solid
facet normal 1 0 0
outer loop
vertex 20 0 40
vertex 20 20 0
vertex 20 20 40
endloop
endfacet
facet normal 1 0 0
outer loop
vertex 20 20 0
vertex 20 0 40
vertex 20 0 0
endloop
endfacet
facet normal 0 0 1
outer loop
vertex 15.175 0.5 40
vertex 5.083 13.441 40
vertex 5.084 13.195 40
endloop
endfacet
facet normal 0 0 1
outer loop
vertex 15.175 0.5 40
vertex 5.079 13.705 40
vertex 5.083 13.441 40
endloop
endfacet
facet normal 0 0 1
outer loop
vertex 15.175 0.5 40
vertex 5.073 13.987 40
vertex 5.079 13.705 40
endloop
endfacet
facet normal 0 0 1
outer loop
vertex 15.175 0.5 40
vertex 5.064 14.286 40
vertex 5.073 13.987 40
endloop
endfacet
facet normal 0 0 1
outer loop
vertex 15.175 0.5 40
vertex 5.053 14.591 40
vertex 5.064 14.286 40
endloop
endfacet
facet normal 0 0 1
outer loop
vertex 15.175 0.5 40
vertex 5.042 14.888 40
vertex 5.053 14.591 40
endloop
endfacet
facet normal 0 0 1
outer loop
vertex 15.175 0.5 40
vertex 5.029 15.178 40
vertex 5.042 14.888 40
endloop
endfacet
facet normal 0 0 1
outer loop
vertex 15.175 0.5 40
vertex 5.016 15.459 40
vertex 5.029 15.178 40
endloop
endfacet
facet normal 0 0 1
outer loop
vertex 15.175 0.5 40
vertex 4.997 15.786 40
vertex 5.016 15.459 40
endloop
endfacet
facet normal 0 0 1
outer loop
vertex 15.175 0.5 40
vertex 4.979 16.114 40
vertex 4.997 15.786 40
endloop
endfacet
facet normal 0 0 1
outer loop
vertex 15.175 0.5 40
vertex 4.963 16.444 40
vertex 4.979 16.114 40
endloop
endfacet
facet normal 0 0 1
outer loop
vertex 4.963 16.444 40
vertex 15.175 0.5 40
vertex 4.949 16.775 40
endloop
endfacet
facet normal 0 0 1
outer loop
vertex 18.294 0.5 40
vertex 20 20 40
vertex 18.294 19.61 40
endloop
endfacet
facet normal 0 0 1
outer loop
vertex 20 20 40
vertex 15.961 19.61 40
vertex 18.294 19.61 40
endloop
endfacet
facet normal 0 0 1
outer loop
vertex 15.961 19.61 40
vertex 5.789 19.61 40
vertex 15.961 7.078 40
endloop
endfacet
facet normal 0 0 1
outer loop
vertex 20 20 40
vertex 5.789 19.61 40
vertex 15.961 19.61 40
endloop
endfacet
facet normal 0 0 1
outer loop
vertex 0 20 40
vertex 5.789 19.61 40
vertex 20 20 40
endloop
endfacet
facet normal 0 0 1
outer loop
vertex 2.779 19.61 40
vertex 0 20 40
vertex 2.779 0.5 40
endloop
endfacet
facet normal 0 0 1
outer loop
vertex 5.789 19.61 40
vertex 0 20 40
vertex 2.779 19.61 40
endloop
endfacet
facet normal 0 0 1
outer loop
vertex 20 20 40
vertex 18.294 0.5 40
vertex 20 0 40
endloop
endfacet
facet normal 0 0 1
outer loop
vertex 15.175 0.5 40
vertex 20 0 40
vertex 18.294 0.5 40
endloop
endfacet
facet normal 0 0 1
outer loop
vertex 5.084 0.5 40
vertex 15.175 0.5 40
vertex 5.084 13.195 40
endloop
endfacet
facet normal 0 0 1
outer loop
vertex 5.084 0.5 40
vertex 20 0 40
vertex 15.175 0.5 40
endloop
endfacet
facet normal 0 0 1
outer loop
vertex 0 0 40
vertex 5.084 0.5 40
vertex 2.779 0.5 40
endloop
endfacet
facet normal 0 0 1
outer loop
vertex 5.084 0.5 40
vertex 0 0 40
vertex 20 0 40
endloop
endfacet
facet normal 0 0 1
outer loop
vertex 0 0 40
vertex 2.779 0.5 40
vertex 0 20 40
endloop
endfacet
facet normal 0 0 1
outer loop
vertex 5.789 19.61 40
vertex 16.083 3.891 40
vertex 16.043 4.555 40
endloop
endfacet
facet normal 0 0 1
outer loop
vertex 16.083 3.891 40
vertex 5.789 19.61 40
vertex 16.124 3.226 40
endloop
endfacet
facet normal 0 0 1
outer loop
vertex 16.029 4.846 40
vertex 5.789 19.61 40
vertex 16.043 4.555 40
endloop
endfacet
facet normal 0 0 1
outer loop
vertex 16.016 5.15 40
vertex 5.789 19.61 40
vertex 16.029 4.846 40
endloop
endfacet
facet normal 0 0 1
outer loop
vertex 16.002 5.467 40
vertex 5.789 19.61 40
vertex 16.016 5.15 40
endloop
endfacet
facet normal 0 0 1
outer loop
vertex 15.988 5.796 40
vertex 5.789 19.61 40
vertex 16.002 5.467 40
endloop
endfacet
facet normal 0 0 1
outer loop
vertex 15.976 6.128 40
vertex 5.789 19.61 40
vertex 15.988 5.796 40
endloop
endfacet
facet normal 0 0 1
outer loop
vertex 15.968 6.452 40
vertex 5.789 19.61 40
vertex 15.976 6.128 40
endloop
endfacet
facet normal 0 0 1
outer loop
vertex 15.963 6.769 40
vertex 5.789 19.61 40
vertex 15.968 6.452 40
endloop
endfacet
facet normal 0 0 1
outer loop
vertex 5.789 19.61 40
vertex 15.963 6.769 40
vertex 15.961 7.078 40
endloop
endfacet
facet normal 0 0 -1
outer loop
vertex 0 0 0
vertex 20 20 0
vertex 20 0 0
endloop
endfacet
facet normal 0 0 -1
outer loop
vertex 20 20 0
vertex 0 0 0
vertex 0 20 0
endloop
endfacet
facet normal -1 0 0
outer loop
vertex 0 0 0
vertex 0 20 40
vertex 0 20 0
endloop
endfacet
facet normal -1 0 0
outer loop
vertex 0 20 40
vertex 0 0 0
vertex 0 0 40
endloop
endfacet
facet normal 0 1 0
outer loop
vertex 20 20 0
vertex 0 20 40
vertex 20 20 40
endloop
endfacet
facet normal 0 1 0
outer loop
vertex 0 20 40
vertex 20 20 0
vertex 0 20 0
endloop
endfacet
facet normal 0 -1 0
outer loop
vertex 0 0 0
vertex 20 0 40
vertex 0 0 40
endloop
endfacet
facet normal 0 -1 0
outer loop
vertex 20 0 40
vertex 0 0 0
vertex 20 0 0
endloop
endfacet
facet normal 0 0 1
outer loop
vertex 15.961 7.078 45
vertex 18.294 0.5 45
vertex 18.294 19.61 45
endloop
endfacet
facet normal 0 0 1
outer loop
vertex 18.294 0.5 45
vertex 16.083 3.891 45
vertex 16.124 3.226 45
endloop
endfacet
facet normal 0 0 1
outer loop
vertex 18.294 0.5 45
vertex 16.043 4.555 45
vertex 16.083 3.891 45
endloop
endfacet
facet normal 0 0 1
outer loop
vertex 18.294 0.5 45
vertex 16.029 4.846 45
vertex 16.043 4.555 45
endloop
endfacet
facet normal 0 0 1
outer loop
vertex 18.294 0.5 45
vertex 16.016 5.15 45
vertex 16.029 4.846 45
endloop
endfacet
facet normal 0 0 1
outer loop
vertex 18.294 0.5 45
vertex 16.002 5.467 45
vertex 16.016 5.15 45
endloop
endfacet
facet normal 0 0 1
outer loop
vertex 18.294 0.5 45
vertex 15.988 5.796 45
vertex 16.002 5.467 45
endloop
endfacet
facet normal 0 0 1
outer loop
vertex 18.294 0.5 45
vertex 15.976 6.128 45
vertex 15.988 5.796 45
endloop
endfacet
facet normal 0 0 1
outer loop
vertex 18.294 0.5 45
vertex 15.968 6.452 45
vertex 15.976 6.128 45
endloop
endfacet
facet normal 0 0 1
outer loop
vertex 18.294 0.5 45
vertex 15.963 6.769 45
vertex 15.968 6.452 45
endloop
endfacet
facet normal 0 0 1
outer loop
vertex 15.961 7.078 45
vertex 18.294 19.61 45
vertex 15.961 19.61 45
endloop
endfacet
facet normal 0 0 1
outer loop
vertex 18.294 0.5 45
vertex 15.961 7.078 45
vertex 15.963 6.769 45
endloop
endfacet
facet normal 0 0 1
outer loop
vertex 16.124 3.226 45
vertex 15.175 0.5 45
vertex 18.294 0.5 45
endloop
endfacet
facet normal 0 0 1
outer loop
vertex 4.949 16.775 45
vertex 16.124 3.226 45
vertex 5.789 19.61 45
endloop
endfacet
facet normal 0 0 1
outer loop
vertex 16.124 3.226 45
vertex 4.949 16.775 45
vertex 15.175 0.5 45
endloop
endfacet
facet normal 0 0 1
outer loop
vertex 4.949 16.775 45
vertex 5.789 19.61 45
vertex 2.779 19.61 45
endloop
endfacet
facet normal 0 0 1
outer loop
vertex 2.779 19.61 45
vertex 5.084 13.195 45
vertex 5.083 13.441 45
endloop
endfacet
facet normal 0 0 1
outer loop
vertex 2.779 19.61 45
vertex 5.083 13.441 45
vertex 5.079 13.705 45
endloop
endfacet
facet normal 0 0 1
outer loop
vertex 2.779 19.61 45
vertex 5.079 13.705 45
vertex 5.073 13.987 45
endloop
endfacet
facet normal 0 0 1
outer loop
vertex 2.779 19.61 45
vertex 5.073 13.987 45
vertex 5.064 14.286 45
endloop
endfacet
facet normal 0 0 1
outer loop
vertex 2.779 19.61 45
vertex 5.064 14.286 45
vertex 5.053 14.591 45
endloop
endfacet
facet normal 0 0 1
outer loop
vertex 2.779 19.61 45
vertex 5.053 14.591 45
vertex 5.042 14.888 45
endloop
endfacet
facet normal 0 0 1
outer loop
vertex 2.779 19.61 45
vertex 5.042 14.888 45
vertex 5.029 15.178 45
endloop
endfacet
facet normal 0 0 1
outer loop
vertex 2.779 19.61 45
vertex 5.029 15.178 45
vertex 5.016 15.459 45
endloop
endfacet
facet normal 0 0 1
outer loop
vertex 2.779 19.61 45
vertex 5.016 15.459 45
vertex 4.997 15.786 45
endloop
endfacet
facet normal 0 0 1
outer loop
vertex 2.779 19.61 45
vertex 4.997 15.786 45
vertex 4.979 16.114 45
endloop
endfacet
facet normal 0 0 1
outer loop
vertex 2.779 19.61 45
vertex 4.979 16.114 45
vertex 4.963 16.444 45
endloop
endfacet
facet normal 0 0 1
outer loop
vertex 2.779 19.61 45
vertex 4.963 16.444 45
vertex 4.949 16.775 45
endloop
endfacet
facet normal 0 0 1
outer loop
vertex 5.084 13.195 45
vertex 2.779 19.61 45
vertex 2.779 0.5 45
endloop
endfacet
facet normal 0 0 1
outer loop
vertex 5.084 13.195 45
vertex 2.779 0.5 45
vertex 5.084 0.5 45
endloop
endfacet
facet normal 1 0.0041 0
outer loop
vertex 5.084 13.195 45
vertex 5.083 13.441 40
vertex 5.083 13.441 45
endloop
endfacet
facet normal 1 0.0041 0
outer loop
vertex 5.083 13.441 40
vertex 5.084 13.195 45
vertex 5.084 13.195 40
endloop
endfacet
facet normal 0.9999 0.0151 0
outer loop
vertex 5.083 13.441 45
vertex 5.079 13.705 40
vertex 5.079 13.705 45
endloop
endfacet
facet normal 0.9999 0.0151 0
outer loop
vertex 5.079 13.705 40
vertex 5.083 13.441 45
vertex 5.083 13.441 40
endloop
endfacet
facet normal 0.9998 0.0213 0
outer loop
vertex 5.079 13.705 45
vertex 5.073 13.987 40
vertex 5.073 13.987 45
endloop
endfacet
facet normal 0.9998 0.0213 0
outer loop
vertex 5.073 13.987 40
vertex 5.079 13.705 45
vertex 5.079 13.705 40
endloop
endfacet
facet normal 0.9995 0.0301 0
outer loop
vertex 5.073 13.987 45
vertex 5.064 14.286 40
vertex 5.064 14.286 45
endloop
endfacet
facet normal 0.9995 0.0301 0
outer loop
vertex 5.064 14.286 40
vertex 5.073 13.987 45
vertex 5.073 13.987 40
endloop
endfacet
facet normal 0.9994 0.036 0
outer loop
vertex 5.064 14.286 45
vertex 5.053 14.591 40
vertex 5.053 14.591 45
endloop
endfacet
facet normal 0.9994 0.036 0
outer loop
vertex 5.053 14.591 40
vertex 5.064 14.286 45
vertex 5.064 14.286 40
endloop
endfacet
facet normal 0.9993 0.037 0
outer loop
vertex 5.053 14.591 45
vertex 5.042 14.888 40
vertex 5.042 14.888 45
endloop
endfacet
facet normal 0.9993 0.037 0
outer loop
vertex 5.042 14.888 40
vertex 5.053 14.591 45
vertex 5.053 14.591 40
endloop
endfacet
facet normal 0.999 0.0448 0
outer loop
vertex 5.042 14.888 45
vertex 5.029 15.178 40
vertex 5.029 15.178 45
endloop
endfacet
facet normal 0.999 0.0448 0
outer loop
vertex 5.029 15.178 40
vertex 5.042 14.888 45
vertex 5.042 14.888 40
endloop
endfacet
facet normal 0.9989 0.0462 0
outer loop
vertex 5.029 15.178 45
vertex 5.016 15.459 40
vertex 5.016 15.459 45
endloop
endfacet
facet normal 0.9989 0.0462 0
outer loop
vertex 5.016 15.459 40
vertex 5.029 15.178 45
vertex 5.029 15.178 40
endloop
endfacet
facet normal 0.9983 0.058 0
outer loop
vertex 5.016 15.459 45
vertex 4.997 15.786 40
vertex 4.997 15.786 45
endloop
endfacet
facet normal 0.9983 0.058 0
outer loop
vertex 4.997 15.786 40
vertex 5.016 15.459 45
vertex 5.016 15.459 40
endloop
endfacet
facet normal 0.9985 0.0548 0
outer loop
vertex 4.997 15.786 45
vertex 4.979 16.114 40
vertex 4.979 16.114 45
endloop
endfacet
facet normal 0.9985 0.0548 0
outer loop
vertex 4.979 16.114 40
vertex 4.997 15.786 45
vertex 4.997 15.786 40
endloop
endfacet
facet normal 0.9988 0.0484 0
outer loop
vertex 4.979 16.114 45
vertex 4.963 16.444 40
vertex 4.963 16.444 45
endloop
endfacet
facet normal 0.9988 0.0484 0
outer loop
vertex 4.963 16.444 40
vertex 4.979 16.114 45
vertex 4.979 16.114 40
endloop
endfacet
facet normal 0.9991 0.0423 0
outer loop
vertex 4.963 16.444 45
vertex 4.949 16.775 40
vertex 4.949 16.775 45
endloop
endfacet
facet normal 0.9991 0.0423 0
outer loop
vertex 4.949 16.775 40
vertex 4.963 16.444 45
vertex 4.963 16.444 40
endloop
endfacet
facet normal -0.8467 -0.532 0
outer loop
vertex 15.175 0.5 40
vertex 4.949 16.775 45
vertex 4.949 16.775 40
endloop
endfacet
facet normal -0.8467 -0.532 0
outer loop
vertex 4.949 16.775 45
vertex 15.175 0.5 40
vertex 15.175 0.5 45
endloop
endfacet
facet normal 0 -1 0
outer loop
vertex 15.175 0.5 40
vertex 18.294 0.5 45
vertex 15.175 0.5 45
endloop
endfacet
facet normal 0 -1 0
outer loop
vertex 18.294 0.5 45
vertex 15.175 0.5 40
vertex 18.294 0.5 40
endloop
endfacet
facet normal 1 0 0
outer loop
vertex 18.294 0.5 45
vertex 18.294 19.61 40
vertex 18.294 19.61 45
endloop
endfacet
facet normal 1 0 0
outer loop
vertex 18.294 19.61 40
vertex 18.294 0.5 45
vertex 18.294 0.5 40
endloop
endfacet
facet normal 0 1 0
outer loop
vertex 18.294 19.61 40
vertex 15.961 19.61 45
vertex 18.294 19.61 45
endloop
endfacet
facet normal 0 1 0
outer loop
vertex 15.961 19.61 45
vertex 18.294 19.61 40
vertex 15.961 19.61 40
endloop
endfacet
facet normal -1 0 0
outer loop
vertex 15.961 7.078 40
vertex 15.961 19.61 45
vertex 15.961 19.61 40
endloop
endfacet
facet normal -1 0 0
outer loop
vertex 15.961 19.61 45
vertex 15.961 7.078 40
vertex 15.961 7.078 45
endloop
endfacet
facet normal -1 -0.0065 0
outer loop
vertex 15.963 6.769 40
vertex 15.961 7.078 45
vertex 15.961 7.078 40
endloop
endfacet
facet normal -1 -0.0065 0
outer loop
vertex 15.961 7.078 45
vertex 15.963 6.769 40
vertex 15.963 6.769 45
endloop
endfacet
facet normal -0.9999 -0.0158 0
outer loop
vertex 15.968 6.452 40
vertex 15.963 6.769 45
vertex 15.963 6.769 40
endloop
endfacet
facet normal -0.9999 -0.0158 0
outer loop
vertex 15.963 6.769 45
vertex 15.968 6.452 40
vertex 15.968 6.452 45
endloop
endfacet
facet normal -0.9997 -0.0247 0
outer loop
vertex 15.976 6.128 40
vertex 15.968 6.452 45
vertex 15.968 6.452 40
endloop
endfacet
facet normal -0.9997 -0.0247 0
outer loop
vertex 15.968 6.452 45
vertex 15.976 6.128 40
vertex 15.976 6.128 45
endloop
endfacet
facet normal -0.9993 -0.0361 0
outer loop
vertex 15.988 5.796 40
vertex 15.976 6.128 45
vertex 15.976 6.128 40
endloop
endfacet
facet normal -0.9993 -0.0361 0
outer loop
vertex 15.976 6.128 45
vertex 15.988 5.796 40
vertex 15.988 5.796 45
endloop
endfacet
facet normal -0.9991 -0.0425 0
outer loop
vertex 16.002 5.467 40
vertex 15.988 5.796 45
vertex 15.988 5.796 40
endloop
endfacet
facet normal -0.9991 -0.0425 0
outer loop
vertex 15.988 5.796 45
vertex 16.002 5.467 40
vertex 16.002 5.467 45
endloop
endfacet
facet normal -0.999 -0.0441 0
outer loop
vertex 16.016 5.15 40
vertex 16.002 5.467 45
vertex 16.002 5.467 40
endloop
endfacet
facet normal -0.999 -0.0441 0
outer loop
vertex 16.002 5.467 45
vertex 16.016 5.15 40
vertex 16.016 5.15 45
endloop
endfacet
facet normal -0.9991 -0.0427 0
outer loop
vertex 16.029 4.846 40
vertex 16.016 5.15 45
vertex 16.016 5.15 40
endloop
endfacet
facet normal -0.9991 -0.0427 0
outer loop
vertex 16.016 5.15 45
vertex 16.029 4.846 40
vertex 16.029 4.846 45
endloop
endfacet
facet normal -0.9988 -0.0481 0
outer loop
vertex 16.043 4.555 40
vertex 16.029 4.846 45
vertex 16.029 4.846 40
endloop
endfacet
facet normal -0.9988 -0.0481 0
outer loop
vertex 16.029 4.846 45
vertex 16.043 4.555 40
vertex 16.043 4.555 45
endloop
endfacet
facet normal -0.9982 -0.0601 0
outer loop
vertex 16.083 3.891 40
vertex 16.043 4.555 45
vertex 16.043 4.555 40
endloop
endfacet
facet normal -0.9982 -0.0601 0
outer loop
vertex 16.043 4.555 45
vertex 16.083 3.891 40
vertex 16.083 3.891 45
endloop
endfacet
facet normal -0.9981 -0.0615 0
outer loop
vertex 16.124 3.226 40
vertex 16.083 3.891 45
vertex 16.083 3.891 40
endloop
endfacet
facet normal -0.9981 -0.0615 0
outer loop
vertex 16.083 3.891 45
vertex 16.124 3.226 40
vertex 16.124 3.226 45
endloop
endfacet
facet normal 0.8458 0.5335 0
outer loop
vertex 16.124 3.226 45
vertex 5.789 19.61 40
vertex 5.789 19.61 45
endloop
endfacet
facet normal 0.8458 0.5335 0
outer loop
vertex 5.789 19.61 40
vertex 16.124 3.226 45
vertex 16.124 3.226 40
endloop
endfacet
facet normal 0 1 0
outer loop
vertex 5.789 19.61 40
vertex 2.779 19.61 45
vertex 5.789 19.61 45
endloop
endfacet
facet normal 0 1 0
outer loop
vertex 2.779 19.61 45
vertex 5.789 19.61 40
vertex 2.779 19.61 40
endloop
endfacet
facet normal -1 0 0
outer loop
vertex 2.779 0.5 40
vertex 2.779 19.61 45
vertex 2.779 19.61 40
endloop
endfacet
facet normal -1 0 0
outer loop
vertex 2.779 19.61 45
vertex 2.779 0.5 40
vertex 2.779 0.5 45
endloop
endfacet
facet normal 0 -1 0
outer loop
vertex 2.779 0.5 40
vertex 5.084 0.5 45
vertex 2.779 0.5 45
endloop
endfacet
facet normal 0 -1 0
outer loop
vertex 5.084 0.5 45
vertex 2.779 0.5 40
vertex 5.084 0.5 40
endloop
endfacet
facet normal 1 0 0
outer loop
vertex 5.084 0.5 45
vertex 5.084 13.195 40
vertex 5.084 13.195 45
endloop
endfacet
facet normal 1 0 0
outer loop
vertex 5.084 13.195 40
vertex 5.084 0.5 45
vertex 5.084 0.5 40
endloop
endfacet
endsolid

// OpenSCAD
cube([20, 20, 40]);
translate([0.5, 0.5, 40]){
    linear_extrude(5){
        text("N", size=20);
    }
}
